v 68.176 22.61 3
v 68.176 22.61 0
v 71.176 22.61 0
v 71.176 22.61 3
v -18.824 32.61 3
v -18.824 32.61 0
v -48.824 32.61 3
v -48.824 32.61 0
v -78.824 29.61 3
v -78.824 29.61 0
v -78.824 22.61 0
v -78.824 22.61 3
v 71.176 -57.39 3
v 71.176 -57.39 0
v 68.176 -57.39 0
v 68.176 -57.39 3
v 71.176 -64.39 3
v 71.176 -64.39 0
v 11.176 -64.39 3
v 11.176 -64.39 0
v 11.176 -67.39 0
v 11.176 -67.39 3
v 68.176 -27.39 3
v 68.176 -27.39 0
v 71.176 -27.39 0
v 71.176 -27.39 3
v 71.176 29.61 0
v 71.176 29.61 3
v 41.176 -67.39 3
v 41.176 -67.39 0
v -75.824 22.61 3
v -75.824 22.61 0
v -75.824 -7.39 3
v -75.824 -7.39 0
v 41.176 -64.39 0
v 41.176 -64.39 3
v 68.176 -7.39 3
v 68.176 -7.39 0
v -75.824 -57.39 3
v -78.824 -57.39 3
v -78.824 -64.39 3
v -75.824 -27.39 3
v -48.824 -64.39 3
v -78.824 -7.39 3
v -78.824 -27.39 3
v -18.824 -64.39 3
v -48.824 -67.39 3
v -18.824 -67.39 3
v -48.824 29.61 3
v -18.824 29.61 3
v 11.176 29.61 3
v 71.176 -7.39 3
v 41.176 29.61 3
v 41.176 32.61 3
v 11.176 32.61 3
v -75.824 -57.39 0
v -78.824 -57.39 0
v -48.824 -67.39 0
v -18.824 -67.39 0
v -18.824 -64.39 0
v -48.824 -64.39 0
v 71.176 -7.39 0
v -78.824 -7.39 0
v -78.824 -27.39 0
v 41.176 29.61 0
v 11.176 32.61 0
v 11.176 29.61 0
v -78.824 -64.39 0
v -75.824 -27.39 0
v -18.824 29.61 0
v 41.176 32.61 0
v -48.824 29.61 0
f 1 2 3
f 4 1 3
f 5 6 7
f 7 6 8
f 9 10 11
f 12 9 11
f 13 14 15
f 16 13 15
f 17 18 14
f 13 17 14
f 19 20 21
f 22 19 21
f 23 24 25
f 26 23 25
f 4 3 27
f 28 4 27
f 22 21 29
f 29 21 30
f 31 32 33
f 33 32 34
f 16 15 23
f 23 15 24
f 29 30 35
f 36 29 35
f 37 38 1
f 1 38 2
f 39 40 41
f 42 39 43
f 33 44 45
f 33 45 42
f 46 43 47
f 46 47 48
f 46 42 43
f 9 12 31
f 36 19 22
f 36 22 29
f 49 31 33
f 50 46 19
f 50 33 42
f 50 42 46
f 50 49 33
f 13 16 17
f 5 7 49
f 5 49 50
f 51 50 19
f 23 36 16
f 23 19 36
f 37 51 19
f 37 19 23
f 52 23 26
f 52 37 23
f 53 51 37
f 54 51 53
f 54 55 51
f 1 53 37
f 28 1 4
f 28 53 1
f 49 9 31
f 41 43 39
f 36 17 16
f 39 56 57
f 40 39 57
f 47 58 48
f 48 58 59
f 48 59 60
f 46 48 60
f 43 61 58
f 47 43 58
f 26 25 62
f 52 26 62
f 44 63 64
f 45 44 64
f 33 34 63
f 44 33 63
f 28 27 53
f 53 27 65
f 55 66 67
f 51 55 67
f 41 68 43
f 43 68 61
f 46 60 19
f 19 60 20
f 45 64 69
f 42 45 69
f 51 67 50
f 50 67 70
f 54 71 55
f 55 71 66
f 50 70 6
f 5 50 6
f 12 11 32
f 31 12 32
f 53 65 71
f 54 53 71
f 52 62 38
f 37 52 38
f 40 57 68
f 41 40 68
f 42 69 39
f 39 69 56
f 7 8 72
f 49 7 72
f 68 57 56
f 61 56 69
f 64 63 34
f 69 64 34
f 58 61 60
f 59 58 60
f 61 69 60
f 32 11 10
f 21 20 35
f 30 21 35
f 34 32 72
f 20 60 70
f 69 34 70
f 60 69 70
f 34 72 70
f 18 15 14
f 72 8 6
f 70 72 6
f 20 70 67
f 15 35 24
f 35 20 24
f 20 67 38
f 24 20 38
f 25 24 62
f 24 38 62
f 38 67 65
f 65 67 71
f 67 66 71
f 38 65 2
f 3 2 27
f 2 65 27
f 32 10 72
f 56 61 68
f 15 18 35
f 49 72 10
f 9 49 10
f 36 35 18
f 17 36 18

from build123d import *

# Parameters (mm, degrees)
BOSS_EXTRU_1_DEPTH = 3


with BuildPart() as part:
    # Esquisse1 → Boss.-Extru.1 (new body)
    with BuildSketch(Plane.XY):
        Polygon((71.175872824, -27.390104167), (71.175872824, -7.390104167), (68.175872824, -7.390104167), (68.175872824, 22.609895833), (71.175872824, 22.609895833), (71.175872824, 29.609895833), (41.175872824, 29.609895833), (41.175872824, 32.609895833), (11.175872824, 32.609895833), (11.175872824, 29.609895833), (-18.824127176, 29.609895833), (-18.824127176, 32.609895833), (-48.824127176, 32.609895833), (-48.824127176, 29.609895833), (-78.824127176, 29.609895833), (-78.824127176, 22.609895833), (-75.824127176, 22.609895833), (-75.824127176, -7.390104167), (-78.824127176, -7.390104167), (-78.824127176, -27.390104167), (-75.824127176, -27.390104167), (-75.824127176, -57.390104167), (-78.824127176, -57.390104167), (-78.824127176, -64.390104167), (-48.824127176, -64.390104167), (-48.824127176, -67.390104167), (-18.824127176, -67.390104167), (-18.824127176, -64.390104167), (11.175872824, -64.390104167), (11.175872824, -67.390104167), (41.175872824, -67.390104167), (41.175872824, -64.390104167), (71.175872824, -64.390104167), (71.175872824, -57.390104167), (68.175872824, -57.390104167), (68.175872824, -27.390104167), align=None)
    extrude(amount=BOSS_EXTRU_1_DEPTH)


solid = part.part
